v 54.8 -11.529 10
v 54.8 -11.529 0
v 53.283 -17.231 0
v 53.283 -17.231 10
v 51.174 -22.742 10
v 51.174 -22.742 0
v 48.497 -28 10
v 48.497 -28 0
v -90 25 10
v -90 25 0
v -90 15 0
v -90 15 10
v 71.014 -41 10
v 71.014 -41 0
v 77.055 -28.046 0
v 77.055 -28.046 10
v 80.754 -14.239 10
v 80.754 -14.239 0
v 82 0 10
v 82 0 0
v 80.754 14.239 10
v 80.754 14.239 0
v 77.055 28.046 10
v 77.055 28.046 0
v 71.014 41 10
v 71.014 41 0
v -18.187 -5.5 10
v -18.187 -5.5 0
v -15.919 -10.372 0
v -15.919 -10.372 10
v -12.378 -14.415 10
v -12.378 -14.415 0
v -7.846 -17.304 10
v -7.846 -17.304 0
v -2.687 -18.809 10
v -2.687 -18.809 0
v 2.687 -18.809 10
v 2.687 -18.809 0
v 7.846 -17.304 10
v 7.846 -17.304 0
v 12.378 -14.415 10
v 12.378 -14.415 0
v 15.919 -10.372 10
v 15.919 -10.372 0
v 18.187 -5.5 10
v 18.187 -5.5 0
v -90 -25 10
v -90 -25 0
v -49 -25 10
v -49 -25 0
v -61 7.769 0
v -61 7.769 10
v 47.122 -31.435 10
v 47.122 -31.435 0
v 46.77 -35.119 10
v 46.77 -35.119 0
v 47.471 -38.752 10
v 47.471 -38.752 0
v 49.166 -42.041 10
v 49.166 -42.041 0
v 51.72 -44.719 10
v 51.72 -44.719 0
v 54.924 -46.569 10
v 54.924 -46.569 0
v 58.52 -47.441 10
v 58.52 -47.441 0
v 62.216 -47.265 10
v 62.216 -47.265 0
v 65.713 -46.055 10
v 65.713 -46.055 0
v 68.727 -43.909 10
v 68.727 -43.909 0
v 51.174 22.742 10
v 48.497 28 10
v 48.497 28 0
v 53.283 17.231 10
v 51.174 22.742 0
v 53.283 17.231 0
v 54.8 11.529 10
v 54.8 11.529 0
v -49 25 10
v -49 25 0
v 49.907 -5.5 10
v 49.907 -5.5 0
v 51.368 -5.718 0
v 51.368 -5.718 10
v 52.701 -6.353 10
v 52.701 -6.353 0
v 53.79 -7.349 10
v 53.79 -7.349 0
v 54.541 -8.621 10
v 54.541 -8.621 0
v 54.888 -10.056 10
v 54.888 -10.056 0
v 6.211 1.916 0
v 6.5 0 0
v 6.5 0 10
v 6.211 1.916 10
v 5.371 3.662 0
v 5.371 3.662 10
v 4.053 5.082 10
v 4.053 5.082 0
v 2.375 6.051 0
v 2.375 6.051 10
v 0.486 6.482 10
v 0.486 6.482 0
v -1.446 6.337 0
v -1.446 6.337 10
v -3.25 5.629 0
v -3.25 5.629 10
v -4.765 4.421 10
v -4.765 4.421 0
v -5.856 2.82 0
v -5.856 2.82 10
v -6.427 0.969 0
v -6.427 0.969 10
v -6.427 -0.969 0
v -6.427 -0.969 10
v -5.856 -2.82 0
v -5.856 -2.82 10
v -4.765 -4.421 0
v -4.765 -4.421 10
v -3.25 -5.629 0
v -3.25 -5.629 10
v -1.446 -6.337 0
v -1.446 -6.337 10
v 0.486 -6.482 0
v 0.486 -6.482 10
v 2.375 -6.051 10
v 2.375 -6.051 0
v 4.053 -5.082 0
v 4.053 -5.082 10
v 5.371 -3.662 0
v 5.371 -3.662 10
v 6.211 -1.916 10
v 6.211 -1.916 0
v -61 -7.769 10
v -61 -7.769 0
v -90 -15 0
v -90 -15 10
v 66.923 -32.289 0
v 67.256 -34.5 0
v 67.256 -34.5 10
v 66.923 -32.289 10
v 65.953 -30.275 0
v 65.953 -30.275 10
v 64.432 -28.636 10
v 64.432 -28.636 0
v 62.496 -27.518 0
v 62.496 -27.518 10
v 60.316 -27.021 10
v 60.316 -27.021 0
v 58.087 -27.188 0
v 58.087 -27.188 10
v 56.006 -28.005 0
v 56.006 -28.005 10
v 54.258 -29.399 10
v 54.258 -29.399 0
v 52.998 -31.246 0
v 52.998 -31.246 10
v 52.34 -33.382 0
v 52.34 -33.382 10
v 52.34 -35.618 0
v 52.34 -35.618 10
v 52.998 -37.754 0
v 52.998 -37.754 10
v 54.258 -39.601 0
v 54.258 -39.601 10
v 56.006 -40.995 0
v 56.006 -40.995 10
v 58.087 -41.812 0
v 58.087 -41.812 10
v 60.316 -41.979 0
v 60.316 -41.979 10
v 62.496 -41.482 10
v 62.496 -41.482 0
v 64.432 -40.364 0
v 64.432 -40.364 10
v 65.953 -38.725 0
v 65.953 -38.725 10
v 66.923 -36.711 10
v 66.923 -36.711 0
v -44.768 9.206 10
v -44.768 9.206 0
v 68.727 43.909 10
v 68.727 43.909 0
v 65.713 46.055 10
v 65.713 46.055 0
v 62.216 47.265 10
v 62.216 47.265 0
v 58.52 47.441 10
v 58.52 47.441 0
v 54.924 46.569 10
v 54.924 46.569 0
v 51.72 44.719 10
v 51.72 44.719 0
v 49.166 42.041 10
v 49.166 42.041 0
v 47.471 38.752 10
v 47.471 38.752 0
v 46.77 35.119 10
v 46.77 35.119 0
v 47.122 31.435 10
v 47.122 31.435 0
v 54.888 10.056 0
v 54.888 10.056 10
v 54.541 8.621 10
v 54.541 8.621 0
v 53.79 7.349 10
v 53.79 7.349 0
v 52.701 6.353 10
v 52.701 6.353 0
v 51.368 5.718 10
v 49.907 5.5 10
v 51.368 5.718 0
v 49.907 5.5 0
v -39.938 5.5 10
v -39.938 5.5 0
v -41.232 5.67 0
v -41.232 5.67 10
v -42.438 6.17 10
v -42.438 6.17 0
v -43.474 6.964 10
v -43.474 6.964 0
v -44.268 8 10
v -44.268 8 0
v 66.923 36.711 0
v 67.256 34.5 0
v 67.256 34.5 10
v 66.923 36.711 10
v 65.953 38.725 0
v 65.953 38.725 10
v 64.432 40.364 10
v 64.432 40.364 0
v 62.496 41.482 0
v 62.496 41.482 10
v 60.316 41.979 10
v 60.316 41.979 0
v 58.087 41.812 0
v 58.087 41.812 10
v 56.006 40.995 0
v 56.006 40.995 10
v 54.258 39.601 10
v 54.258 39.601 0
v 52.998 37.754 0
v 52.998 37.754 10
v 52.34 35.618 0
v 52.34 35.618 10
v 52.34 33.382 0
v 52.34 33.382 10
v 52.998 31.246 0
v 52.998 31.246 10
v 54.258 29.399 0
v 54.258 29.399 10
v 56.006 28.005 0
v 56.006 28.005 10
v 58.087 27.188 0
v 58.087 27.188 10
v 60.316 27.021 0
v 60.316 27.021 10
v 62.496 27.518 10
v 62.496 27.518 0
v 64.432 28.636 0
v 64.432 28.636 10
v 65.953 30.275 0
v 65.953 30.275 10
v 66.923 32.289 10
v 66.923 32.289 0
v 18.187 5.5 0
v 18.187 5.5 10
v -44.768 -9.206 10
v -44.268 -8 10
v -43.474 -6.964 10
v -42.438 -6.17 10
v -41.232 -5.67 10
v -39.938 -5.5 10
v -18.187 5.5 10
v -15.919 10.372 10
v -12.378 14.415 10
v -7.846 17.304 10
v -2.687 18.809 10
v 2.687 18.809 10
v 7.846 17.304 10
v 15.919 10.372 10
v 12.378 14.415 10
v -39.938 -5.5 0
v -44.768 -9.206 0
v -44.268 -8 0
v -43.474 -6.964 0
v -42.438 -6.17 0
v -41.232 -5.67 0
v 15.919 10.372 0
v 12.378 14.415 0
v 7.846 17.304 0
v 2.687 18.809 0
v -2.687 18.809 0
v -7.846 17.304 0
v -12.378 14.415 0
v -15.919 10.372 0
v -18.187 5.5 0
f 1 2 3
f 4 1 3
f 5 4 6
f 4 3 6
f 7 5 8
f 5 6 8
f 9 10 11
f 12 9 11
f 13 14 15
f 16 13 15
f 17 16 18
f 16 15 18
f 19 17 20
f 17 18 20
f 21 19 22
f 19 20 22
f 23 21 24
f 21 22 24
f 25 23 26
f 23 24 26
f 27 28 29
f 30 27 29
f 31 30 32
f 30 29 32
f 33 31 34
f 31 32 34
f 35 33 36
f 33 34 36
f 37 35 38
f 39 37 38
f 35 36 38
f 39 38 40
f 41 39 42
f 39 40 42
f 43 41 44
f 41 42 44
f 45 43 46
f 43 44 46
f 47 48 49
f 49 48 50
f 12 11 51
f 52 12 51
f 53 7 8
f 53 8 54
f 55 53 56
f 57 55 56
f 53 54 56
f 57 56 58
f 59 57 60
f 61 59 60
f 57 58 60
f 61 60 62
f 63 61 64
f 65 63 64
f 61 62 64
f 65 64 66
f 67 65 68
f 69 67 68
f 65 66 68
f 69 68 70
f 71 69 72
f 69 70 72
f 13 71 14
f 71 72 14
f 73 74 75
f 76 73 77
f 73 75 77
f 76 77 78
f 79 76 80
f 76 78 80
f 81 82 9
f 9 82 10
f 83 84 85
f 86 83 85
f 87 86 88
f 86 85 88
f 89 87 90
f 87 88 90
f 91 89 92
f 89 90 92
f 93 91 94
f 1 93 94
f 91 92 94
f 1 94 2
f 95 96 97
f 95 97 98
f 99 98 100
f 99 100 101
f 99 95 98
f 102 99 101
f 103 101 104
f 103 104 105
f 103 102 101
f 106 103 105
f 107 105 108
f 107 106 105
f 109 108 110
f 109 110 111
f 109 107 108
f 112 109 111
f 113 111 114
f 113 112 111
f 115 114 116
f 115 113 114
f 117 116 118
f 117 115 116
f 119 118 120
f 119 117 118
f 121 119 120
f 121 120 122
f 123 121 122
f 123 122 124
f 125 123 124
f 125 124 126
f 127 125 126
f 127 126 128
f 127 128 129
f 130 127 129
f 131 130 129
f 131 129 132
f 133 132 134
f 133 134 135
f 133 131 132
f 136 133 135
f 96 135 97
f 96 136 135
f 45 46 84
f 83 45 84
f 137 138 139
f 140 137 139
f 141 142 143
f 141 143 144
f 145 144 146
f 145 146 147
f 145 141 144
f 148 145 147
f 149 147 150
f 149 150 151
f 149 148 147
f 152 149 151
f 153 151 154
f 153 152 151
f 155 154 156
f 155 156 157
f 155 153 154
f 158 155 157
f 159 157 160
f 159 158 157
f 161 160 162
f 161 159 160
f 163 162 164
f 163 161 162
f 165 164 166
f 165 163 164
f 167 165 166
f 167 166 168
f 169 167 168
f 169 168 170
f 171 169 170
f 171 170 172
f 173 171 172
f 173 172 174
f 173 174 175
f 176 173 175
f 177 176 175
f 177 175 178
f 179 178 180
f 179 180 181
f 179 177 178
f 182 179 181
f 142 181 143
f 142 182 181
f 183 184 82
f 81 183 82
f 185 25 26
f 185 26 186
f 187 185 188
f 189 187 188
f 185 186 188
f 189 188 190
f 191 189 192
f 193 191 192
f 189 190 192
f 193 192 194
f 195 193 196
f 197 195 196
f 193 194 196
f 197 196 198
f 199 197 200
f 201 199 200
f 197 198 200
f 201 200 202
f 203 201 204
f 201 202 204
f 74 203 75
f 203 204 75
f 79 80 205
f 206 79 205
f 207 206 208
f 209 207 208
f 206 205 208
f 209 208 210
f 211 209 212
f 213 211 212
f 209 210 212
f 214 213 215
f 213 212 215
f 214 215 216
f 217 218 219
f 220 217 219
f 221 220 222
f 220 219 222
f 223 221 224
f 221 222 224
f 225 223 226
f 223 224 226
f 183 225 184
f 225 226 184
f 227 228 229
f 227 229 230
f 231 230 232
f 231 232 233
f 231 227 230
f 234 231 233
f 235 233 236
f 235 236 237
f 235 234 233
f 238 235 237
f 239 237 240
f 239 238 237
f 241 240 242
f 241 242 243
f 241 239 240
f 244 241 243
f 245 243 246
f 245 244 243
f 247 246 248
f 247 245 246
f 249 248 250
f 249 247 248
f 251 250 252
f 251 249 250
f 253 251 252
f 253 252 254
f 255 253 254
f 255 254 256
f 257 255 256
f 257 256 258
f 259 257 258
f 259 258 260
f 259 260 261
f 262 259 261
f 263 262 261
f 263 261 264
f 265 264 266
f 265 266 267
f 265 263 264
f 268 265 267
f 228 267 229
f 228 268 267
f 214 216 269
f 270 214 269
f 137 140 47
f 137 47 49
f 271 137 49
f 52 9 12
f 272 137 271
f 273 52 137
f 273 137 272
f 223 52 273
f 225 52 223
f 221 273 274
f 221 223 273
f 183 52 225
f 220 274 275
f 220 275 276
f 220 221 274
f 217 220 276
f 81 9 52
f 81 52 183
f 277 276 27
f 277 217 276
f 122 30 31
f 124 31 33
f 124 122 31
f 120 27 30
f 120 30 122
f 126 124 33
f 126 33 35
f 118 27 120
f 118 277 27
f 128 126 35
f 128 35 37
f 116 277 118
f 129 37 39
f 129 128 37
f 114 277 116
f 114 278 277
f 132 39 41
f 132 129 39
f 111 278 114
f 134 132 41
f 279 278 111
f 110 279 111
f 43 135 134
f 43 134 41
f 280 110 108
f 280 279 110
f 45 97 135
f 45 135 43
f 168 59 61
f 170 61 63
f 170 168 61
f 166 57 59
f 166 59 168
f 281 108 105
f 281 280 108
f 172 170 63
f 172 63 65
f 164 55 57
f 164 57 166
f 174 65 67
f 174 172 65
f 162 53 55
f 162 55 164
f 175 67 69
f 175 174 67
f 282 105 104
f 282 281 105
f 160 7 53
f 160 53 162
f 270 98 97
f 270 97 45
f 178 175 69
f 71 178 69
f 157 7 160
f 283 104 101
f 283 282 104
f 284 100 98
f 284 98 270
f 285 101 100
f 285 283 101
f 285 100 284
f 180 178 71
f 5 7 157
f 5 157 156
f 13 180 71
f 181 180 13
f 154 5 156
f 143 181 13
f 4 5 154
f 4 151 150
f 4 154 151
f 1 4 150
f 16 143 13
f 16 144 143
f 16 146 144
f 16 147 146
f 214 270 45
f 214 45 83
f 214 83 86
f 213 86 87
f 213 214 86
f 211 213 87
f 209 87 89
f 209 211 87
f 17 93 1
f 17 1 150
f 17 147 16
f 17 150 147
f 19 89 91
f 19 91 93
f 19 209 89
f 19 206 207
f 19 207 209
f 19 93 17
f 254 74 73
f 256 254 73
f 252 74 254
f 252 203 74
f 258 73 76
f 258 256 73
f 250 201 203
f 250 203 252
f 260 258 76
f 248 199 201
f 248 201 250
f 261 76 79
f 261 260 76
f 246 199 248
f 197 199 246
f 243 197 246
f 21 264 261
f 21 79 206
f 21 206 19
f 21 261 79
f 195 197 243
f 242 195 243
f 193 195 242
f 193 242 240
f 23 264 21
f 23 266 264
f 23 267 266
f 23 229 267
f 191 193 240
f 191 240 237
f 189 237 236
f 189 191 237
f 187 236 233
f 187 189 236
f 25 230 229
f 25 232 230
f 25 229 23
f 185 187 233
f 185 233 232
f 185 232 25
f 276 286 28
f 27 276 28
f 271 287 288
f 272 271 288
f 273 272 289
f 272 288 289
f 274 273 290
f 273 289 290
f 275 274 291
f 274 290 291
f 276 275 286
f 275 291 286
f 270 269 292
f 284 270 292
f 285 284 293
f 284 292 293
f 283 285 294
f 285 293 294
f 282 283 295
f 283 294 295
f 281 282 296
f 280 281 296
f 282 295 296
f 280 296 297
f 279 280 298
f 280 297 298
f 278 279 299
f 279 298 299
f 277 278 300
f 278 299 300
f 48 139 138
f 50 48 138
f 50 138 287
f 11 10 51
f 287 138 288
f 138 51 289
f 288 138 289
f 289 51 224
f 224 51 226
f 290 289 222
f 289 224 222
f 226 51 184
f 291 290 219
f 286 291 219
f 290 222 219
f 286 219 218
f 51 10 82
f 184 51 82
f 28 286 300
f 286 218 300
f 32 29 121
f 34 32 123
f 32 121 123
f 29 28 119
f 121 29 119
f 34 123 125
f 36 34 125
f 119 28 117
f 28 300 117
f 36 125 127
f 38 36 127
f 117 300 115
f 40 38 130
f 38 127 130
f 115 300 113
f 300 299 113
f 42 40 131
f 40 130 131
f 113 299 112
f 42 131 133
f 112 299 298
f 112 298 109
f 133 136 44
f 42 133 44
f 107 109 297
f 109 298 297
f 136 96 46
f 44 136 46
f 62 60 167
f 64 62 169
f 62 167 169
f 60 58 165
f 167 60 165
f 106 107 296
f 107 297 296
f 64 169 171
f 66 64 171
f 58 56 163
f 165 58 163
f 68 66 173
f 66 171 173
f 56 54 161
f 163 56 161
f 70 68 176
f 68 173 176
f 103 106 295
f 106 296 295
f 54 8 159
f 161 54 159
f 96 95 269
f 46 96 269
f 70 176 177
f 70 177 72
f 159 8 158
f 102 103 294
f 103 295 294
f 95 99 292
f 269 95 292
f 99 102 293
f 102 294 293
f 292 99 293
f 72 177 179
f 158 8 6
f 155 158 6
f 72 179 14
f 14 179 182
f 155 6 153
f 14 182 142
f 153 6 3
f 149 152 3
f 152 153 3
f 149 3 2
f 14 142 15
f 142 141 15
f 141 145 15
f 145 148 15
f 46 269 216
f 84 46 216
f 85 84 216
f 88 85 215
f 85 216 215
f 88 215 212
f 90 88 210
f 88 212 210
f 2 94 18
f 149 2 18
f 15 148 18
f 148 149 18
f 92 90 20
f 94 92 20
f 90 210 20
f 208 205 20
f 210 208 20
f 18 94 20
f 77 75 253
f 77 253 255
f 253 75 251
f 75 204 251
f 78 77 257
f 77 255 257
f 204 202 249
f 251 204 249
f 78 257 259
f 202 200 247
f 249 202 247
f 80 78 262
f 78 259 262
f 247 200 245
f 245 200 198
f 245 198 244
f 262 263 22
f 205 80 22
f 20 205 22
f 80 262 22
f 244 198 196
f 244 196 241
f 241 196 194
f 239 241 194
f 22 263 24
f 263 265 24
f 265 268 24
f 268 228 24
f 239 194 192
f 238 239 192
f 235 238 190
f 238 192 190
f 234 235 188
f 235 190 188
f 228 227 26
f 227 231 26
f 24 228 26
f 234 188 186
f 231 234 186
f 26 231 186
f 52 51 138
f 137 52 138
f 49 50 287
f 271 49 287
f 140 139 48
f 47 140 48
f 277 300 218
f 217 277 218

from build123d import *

# Parameters (mm, degrees)
SKETCH1_R           = 6.5
SKETCH1_R_2         = 7.5
BOSS_EXTRUDE1_DEPTH = 10


with BuildPart() as part:
    # Sketch1 → Boss-Extrude1 (new body)
    with BuildSketch(Plane.XY):
        with BuildLine():
            Line((-90, 25), (-90, 15))
            Line((-90, 15), (-61, 7.769487918))
            Line((-61, 7.769487918), (-61, -7.769487918))
            Line((-61, -7.769487918), (-90, -15))
            Line((-90, -15), (-90, -25))
            Line((-90, -25), (-49, -25))
            Line((-49, -25), (-44.767984939, -9.205904774))
            ThreePointArc((-44.767984939, -9.205904774), (-42.982162953, -6.533233299), (-39.938355808, -5.5))
            Line((-39.938355808, -5.5), (-18.186533479, -5.5))
            ThreePointArc((-18.186533479, -5.5), (0, -19), (18.186533479, -5.5))
            Line((18.186533479, -5.5), (49.907414279, -5.5))
            ThreePointArc((49.907414279, -5.5), (53.789878627, -7.349369811), (54.800298032, -11.529411765))
            ThreePointArc((54.800298032, -11.529411765), (52.301289102, -20.014373791), (48.497422612, -28))
            ThreePointArc((48.497422612, -28), (53.255752861, -45.758330249), (71.01408311, -41))
            ThreePointArc((71.01408311, -41), (82, 0), (71.01408311, 41))
            ThreePointArc((71.01408311, 41), (53.255752861, 45.758330249), (48.497422612, 28))
            ThreePointArc((48.497422612, 28), (52.301289102, 20.014373791), (54.800298032, 11.529411765))
            ThreePointArc((54.800298032, 11.529411765), (53.789878627, 7.349369811), (49.907414279, 5.5))
            Line((49.907414279, 5.5), (18.186533479, 5.5))
            ThreePointArc((18.186533479, 5.5), (0, 19), (-18.186533479, 5.5))
            Line((-18.186533479, 5.5), (-39.938355808, 5.5))
            ThreePointArc((-39.938355808, 5.5), (-42.982162953, 6.533233299), (-44.767984939, 9.205904774))
            Line((-44.767984939, 9.205904774), (-49, 25))
            Line((-49, 25), (-90, 25))
        make_face()
        Circle(SKETCH1_R, mode=Mode.SUBTRACT)
        with Locations((59.755752861, 34.5)):
            Circle(SKETCH1_R_2, mode=Mode.SUBTRACT)
        with Locations((59.755752861, -34.5)):
            Circle(SKETCH1_R_2, mode=Mode.SUBTRACT)
    extrude(amount=BOSS_EXTRUDE1_DEPTH)


solid = part.part
